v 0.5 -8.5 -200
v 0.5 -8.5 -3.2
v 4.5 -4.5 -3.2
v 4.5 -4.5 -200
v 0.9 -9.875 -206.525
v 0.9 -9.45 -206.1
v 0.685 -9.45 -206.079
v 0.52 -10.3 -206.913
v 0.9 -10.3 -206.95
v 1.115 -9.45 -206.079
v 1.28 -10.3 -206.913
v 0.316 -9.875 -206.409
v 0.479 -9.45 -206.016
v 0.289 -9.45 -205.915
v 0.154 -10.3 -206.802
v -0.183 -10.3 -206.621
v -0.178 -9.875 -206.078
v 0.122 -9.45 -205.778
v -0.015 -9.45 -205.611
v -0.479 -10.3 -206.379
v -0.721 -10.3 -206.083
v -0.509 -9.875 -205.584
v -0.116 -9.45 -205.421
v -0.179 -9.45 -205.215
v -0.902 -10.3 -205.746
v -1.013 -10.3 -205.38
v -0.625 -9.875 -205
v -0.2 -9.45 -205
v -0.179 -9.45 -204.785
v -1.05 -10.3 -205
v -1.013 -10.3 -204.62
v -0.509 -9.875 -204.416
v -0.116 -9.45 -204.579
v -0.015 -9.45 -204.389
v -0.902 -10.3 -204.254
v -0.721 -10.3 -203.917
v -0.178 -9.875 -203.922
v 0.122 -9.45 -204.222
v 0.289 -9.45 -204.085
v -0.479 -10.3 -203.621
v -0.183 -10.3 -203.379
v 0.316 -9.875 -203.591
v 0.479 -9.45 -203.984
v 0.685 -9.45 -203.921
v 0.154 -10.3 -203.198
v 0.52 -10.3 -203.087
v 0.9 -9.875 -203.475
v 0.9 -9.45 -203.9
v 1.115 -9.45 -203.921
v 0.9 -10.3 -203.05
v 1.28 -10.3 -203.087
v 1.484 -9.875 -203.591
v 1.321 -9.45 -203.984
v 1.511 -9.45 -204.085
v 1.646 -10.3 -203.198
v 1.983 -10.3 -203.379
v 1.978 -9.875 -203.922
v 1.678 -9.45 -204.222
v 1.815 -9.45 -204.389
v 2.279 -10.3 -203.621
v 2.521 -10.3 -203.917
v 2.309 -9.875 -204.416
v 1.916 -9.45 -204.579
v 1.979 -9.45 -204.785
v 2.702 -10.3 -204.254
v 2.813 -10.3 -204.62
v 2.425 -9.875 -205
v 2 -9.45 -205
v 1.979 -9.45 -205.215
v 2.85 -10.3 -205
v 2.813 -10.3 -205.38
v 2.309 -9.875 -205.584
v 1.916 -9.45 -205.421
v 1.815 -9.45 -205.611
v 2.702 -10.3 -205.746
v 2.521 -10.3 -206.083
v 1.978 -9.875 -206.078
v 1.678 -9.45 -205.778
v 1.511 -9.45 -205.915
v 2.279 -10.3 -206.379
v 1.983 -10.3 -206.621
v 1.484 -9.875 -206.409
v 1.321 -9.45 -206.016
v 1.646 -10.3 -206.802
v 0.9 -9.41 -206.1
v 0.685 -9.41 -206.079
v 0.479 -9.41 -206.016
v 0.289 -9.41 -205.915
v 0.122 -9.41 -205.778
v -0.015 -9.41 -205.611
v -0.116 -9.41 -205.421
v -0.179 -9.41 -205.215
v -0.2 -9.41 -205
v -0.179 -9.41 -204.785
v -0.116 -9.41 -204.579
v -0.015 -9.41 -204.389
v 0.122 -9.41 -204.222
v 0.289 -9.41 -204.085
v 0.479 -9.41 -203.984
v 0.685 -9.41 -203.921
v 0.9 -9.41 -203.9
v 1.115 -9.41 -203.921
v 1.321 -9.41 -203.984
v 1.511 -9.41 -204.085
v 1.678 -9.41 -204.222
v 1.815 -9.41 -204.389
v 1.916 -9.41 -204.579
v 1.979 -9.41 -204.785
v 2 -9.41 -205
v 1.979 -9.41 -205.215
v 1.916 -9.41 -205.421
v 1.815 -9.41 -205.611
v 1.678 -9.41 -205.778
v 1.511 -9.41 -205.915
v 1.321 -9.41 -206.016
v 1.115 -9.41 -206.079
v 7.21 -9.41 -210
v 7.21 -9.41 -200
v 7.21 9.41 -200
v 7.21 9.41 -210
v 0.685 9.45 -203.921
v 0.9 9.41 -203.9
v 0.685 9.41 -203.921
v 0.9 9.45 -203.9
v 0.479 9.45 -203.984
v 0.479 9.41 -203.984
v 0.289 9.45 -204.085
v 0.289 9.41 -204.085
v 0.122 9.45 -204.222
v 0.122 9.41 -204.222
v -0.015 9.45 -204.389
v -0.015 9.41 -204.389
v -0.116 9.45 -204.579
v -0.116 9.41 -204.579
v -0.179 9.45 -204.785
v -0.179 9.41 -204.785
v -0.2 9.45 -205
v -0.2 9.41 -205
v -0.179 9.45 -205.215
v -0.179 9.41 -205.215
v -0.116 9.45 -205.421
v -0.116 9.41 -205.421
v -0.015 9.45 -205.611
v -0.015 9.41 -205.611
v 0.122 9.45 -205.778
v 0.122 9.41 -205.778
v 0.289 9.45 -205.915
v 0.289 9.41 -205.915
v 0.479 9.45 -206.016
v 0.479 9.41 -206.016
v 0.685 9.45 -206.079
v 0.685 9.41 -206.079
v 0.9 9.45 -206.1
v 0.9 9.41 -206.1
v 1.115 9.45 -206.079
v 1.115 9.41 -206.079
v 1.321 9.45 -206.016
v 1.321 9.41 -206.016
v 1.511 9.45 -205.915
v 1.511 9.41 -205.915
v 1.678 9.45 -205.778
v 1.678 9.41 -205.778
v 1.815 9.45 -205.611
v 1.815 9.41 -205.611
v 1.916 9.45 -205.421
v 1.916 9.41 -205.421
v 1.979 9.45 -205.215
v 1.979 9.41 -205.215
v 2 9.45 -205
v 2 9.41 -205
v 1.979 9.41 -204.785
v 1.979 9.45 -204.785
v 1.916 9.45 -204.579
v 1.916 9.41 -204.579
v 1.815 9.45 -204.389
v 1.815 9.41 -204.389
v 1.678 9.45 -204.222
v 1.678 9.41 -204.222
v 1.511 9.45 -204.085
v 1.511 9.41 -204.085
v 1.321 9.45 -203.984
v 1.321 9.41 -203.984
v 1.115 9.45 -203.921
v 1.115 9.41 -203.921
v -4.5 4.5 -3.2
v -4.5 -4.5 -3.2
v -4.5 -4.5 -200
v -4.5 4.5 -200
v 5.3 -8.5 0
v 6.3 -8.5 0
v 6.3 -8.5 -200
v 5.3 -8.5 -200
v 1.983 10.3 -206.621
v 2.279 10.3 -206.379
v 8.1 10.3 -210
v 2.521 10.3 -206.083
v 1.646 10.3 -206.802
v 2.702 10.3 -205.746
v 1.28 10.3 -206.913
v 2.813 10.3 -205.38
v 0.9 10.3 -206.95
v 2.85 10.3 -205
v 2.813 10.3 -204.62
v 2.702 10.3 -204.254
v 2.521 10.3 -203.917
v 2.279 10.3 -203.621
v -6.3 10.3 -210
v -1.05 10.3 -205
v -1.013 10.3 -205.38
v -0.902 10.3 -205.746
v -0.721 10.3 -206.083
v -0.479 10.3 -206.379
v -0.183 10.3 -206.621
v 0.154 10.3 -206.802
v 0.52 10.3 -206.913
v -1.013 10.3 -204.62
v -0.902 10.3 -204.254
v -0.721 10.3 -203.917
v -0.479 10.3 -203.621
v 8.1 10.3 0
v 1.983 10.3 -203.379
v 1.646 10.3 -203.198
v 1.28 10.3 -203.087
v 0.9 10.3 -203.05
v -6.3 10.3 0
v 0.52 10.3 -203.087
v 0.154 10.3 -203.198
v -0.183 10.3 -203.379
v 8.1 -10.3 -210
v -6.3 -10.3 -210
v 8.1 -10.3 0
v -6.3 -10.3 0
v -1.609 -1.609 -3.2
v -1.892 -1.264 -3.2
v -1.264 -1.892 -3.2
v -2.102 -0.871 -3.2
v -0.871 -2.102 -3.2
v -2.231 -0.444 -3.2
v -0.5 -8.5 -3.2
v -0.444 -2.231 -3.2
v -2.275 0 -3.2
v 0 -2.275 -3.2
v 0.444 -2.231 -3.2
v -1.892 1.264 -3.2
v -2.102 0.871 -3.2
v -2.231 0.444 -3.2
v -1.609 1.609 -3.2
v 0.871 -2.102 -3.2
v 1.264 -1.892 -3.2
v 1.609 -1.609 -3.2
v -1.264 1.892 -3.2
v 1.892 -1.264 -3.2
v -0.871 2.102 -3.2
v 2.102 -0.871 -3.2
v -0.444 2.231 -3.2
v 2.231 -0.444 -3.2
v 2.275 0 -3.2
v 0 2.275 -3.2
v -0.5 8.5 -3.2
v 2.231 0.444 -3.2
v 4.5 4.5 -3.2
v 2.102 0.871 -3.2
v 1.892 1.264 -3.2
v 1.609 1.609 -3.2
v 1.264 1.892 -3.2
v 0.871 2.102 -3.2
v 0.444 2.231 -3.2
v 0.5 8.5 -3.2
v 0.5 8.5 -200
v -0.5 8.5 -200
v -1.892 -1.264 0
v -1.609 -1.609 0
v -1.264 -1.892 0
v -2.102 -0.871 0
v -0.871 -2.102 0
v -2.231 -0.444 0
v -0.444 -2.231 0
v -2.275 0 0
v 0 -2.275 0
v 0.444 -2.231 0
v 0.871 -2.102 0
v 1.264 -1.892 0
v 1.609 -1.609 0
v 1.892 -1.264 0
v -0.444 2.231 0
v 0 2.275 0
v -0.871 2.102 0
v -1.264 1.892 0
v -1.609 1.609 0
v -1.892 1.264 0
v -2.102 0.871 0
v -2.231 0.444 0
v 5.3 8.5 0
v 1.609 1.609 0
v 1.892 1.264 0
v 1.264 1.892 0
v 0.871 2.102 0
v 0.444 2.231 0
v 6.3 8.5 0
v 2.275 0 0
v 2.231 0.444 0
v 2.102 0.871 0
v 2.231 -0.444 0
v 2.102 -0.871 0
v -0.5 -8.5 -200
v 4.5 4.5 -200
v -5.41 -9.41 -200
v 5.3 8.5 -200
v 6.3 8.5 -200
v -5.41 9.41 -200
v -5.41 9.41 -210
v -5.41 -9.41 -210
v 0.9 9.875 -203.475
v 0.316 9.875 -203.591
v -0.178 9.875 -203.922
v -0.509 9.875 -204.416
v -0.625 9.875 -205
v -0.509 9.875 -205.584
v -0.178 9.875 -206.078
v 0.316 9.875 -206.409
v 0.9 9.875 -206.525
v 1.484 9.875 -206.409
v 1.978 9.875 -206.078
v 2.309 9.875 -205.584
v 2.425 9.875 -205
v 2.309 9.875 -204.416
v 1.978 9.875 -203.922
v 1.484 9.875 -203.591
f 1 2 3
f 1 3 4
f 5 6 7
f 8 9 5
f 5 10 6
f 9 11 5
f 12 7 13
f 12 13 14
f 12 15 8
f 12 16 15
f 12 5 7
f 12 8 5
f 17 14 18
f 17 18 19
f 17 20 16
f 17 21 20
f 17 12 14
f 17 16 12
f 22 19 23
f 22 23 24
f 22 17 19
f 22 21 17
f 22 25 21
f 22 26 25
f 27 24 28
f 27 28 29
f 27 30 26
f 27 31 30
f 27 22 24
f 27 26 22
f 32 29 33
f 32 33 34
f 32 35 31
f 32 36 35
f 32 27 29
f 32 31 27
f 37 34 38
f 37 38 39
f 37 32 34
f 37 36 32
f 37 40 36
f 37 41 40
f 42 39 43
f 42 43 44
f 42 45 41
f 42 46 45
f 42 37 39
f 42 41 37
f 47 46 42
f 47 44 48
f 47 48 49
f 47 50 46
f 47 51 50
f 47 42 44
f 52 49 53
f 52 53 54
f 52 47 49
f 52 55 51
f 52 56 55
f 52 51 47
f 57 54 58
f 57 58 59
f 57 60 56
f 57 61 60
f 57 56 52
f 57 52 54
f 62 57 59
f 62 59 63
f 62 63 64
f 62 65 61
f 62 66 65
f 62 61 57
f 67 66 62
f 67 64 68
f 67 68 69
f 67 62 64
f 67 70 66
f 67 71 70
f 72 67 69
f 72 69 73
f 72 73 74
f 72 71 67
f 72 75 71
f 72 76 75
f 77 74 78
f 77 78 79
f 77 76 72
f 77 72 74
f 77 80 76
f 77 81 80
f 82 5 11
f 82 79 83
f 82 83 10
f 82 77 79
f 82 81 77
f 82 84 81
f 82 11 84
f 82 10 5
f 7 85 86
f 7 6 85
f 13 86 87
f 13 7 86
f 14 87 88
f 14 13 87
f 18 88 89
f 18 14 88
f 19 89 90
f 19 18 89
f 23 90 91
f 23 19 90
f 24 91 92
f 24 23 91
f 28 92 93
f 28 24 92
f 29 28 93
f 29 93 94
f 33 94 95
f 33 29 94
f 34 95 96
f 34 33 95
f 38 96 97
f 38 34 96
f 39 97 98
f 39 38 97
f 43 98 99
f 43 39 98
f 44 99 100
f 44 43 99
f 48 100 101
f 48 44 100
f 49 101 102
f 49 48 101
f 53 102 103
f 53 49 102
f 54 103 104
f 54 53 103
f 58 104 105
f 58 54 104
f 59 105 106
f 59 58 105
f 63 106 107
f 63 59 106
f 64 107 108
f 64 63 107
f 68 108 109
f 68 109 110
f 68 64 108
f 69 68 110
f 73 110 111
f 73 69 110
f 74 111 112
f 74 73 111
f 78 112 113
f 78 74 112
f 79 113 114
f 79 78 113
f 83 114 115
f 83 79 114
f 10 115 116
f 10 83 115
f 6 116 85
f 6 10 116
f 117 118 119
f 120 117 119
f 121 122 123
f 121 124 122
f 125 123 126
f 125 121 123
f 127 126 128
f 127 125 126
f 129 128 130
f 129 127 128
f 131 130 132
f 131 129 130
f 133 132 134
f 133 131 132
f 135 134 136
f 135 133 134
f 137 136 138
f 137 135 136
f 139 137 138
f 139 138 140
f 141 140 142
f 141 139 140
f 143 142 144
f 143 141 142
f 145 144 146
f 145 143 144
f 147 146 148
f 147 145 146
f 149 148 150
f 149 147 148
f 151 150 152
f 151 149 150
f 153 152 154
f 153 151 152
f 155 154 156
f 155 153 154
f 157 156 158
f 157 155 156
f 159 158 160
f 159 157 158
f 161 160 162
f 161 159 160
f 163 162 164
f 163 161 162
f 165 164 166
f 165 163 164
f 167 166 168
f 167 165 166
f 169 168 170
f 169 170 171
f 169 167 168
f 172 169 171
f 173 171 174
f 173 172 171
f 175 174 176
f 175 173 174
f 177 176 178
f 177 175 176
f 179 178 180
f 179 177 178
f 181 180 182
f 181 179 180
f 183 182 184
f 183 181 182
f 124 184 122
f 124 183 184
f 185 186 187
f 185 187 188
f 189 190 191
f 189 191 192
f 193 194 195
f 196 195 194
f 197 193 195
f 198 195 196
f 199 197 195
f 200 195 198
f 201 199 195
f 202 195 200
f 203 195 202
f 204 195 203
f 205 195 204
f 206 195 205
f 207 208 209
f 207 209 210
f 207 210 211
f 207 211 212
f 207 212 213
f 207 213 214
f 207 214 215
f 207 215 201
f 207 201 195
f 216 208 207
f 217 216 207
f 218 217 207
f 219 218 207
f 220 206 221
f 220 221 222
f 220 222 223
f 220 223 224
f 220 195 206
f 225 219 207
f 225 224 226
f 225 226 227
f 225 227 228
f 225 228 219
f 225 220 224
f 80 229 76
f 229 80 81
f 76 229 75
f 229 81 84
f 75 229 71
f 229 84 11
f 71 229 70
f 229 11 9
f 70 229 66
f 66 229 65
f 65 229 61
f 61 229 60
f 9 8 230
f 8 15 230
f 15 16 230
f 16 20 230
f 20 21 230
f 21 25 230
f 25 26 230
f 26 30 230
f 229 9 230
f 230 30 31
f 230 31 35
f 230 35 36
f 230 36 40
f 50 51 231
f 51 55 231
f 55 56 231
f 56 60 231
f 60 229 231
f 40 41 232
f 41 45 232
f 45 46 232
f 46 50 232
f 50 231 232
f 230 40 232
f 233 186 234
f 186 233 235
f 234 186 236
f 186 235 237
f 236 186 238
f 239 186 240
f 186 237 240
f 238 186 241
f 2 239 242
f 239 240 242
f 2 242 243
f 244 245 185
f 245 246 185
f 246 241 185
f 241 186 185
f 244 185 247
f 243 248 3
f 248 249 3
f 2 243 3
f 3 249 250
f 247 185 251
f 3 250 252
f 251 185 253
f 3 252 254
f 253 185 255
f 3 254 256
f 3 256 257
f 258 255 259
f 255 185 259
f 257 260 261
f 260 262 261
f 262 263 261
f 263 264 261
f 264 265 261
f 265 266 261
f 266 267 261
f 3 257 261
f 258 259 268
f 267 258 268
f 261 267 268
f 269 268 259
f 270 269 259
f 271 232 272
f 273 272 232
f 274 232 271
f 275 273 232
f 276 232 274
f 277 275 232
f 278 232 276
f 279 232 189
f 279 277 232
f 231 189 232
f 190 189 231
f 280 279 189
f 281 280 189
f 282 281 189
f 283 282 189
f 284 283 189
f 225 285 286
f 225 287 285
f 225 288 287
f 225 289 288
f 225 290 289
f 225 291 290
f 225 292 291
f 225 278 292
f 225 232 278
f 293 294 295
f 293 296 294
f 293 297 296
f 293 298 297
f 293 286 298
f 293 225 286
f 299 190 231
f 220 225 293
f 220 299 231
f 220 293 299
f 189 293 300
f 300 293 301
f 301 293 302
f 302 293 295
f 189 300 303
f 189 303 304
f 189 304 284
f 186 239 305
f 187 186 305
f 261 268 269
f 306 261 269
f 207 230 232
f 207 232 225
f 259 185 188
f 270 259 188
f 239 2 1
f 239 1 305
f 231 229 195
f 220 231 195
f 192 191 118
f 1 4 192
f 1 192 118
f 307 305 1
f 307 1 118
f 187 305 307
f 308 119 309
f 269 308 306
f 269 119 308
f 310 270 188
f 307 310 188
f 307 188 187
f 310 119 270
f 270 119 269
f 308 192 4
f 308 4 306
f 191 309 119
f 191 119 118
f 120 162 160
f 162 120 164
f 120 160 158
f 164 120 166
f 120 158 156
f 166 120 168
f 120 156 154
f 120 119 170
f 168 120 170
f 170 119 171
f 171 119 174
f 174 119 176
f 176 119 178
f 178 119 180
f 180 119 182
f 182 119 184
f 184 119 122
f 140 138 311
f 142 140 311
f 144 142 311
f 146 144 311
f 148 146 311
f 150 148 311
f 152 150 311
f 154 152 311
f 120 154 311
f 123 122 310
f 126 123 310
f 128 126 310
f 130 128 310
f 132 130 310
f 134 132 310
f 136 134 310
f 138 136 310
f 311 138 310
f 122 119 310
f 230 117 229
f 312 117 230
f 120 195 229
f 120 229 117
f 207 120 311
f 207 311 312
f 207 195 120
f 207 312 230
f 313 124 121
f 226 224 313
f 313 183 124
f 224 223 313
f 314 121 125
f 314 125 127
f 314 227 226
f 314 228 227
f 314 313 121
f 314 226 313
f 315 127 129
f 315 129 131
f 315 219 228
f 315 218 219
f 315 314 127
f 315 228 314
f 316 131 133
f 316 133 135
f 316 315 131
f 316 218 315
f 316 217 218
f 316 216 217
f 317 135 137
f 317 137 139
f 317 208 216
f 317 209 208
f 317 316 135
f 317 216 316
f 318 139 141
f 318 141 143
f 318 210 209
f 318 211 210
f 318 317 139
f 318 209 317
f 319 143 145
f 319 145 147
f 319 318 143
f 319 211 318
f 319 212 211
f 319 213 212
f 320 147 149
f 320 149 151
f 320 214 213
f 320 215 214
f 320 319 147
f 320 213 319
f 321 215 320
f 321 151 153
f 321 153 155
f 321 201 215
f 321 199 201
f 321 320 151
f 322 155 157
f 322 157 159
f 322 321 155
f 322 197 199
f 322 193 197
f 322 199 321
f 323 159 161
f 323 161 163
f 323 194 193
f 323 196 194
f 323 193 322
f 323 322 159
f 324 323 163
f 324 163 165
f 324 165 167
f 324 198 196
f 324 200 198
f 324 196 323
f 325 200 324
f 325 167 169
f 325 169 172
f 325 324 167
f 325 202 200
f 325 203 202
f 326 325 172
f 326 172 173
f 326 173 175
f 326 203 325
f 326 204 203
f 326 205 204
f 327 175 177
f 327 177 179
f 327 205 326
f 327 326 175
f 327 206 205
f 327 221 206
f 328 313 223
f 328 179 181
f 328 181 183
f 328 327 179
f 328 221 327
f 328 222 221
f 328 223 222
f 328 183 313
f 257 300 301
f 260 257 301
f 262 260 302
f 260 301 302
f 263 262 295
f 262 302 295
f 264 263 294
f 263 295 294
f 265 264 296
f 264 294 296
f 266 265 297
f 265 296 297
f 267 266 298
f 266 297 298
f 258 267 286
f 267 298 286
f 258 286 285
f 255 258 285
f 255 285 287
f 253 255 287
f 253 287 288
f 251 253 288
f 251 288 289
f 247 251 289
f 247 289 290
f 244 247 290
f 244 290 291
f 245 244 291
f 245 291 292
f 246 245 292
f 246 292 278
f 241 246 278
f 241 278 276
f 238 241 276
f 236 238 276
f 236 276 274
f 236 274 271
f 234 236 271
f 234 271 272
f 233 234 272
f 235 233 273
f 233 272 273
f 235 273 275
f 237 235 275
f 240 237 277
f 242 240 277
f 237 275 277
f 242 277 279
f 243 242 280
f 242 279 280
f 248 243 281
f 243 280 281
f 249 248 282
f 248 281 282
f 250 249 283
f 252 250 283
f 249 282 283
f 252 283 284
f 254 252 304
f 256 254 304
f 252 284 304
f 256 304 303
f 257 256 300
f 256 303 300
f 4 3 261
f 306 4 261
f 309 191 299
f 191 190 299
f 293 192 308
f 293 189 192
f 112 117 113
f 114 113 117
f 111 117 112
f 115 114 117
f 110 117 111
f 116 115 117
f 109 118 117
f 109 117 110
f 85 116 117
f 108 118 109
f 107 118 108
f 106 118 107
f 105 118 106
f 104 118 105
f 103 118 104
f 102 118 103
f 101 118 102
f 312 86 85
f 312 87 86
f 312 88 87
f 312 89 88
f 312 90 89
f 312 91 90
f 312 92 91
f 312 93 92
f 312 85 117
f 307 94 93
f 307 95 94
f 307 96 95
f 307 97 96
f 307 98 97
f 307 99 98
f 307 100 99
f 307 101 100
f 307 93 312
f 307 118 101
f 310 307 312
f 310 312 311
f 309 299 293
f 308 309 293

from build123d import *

# Parameters (mm, degrees)
SKETCH2_W        = 14.4
SKETCH2_H        = 20.6
SKETCH2_W_2      = 1
SKETCH2_H_2      = 17
TOP_DEPTH        = 3.2
SKETCH3_W        = 14.4
SKETCH3_H        = 20.6
SKETCH3_W_2      = 10.8
SKETCH3_H_2      = 17
BODY_DEPTH       = 196.8
SKETCH4_W        = 14.4
SKETCH4_H        = 20.6
SKETCH4_W_2      = 12.62
SKETCH4_H_2      = 18.82
INSERT_DEPTH     = 10
SKETCH5_W        = 0.8
SKETCH5_H        = 17
FLEX_DEPTH       = 196.8
SERVO_GEAR_REACH = 212.408
SKETCH9_R        = 2.275
CHAMFER1_SIZE    = 4


with BuildPart() as part:
    # Sketch2 → Top (new body)
    with BuildSketch(Plane.XY):
        with Locations((0.9, 0)):
            Rectangle(SKETCH2_W, SKETCH2_H)
        with Locations((5.8, 0)):
            Rectangle(SKETCH2_W_2, SKETCH2_H_2, mode=Mode.SUBTRACT)
    extrude(amount=-TOP_DEPTH)

    # Sketch3 → Body (add)
    with BuildSketch(Plane(origin=(0, 0, -3.2), x_dir=(-1, 0, 0), z_dir=(0, 0, -1))):
        with Locations((-0.9, 0)):
            Rectangle(SKETCH3_W, SKETCH3_H)
        with Locations((-0.9, 0)):
            Rectangle(SKETCH3_W_2, SKETCH3_H_2, mode=Mode.SUBTRACT)
    extrude(amount=BODY_DEPTH)

    # Sketch4 → Insert (add)
    with BuildSketch(Plane(origin=(0, 0, -200), x_dir=(-1, 0, 0), z_dir=(0, 0, -1))):
        with Locations((-0.9, 0)):
            Rectangle(SKETCH4_W, SKETCH4_H)
        with Locations((-0.9, 0)):
            Rectangle(SKETCH4_W_2, SKETCH4_H_2, mode=Mode.SUBTRACT)
    extrude(amount=INSERT_DEPTH)

    # Sketch5 → Flex (add)
    with BuildSketch(Plane(origin=(0, 0, -3.2), x_dir=(-1, 0, 0), z_dir=(0, 0, -1))):
        with Locations((-4.9, 0)):
            Rectangle(SKETCH5_W, SKETCH5_H)
    extrude(amount=FLEX_DEPTH)

    # Sketch9 → Servo gear (cut, up to next)
    with BuildSketch(Plane.XY, mode=Mode.PRIVATE) as servo_gear_sk1:
        Circle(SKETCH9_R)
    servo_gear_tool1 = extrude(servo_gear_sk1.sketch, amount=-SERVO_GEAR_REACH, mode=Mode.PRIVATE) & part.part
    add(servo_gear_tool1.solids().sort_by_distance((0, 0, 0))[0], mode=Mode.SUBTRACT)

    # Sketch15 → CSK for M2 Flat Head Machine Screw2 (revolve, cut)
    with BuildSketch(Plane(origin=(0.9, -10.3, -205), x_dir=(0, 0, -1), z_dir=(1, 0, 0))):
        Polygon((0, 0), (0, 0.89), (1.1, 0.89), (1.1, 0.85), (1.95, 0), align=None)
    revolve(axis=Axis((0.9, -16.65, -205), (0, 1, 0)), mode=Mode.SUBTRACT)

    # Sketch18 → CSK for M2 Flat Head Machine Screw3 (revolve, cut)
    with BuildSketch(Plane(origin=(0.9, 10.3, -205), x_dir=(0, 0, 1), z_dir=(1, 0, 0))):
        Polygon((0, 0), (0, 0.89), (1.1, 0.89), (1.1, 0.85), (1.95, 0), align=None)
    revolve(axis=Axis((0.9, 16.65, -205), (0, -1, 0)), mode=Mode.SUBTRACT)

    # Chamfer1
    chamfer1_edges = [part.edges().sort_by_distance(p)[0] for p in [
        (-4.5, -8.5, -101.6),
        (-4.5, 8.5, -101.6),
        (4.5, 8.5, -101.6),
        (4.5, -8.5, -101.6),
    ]]
    chamfer(chamfer1_edges, length=CHAMFER1_SIZE)


solid = part.part
